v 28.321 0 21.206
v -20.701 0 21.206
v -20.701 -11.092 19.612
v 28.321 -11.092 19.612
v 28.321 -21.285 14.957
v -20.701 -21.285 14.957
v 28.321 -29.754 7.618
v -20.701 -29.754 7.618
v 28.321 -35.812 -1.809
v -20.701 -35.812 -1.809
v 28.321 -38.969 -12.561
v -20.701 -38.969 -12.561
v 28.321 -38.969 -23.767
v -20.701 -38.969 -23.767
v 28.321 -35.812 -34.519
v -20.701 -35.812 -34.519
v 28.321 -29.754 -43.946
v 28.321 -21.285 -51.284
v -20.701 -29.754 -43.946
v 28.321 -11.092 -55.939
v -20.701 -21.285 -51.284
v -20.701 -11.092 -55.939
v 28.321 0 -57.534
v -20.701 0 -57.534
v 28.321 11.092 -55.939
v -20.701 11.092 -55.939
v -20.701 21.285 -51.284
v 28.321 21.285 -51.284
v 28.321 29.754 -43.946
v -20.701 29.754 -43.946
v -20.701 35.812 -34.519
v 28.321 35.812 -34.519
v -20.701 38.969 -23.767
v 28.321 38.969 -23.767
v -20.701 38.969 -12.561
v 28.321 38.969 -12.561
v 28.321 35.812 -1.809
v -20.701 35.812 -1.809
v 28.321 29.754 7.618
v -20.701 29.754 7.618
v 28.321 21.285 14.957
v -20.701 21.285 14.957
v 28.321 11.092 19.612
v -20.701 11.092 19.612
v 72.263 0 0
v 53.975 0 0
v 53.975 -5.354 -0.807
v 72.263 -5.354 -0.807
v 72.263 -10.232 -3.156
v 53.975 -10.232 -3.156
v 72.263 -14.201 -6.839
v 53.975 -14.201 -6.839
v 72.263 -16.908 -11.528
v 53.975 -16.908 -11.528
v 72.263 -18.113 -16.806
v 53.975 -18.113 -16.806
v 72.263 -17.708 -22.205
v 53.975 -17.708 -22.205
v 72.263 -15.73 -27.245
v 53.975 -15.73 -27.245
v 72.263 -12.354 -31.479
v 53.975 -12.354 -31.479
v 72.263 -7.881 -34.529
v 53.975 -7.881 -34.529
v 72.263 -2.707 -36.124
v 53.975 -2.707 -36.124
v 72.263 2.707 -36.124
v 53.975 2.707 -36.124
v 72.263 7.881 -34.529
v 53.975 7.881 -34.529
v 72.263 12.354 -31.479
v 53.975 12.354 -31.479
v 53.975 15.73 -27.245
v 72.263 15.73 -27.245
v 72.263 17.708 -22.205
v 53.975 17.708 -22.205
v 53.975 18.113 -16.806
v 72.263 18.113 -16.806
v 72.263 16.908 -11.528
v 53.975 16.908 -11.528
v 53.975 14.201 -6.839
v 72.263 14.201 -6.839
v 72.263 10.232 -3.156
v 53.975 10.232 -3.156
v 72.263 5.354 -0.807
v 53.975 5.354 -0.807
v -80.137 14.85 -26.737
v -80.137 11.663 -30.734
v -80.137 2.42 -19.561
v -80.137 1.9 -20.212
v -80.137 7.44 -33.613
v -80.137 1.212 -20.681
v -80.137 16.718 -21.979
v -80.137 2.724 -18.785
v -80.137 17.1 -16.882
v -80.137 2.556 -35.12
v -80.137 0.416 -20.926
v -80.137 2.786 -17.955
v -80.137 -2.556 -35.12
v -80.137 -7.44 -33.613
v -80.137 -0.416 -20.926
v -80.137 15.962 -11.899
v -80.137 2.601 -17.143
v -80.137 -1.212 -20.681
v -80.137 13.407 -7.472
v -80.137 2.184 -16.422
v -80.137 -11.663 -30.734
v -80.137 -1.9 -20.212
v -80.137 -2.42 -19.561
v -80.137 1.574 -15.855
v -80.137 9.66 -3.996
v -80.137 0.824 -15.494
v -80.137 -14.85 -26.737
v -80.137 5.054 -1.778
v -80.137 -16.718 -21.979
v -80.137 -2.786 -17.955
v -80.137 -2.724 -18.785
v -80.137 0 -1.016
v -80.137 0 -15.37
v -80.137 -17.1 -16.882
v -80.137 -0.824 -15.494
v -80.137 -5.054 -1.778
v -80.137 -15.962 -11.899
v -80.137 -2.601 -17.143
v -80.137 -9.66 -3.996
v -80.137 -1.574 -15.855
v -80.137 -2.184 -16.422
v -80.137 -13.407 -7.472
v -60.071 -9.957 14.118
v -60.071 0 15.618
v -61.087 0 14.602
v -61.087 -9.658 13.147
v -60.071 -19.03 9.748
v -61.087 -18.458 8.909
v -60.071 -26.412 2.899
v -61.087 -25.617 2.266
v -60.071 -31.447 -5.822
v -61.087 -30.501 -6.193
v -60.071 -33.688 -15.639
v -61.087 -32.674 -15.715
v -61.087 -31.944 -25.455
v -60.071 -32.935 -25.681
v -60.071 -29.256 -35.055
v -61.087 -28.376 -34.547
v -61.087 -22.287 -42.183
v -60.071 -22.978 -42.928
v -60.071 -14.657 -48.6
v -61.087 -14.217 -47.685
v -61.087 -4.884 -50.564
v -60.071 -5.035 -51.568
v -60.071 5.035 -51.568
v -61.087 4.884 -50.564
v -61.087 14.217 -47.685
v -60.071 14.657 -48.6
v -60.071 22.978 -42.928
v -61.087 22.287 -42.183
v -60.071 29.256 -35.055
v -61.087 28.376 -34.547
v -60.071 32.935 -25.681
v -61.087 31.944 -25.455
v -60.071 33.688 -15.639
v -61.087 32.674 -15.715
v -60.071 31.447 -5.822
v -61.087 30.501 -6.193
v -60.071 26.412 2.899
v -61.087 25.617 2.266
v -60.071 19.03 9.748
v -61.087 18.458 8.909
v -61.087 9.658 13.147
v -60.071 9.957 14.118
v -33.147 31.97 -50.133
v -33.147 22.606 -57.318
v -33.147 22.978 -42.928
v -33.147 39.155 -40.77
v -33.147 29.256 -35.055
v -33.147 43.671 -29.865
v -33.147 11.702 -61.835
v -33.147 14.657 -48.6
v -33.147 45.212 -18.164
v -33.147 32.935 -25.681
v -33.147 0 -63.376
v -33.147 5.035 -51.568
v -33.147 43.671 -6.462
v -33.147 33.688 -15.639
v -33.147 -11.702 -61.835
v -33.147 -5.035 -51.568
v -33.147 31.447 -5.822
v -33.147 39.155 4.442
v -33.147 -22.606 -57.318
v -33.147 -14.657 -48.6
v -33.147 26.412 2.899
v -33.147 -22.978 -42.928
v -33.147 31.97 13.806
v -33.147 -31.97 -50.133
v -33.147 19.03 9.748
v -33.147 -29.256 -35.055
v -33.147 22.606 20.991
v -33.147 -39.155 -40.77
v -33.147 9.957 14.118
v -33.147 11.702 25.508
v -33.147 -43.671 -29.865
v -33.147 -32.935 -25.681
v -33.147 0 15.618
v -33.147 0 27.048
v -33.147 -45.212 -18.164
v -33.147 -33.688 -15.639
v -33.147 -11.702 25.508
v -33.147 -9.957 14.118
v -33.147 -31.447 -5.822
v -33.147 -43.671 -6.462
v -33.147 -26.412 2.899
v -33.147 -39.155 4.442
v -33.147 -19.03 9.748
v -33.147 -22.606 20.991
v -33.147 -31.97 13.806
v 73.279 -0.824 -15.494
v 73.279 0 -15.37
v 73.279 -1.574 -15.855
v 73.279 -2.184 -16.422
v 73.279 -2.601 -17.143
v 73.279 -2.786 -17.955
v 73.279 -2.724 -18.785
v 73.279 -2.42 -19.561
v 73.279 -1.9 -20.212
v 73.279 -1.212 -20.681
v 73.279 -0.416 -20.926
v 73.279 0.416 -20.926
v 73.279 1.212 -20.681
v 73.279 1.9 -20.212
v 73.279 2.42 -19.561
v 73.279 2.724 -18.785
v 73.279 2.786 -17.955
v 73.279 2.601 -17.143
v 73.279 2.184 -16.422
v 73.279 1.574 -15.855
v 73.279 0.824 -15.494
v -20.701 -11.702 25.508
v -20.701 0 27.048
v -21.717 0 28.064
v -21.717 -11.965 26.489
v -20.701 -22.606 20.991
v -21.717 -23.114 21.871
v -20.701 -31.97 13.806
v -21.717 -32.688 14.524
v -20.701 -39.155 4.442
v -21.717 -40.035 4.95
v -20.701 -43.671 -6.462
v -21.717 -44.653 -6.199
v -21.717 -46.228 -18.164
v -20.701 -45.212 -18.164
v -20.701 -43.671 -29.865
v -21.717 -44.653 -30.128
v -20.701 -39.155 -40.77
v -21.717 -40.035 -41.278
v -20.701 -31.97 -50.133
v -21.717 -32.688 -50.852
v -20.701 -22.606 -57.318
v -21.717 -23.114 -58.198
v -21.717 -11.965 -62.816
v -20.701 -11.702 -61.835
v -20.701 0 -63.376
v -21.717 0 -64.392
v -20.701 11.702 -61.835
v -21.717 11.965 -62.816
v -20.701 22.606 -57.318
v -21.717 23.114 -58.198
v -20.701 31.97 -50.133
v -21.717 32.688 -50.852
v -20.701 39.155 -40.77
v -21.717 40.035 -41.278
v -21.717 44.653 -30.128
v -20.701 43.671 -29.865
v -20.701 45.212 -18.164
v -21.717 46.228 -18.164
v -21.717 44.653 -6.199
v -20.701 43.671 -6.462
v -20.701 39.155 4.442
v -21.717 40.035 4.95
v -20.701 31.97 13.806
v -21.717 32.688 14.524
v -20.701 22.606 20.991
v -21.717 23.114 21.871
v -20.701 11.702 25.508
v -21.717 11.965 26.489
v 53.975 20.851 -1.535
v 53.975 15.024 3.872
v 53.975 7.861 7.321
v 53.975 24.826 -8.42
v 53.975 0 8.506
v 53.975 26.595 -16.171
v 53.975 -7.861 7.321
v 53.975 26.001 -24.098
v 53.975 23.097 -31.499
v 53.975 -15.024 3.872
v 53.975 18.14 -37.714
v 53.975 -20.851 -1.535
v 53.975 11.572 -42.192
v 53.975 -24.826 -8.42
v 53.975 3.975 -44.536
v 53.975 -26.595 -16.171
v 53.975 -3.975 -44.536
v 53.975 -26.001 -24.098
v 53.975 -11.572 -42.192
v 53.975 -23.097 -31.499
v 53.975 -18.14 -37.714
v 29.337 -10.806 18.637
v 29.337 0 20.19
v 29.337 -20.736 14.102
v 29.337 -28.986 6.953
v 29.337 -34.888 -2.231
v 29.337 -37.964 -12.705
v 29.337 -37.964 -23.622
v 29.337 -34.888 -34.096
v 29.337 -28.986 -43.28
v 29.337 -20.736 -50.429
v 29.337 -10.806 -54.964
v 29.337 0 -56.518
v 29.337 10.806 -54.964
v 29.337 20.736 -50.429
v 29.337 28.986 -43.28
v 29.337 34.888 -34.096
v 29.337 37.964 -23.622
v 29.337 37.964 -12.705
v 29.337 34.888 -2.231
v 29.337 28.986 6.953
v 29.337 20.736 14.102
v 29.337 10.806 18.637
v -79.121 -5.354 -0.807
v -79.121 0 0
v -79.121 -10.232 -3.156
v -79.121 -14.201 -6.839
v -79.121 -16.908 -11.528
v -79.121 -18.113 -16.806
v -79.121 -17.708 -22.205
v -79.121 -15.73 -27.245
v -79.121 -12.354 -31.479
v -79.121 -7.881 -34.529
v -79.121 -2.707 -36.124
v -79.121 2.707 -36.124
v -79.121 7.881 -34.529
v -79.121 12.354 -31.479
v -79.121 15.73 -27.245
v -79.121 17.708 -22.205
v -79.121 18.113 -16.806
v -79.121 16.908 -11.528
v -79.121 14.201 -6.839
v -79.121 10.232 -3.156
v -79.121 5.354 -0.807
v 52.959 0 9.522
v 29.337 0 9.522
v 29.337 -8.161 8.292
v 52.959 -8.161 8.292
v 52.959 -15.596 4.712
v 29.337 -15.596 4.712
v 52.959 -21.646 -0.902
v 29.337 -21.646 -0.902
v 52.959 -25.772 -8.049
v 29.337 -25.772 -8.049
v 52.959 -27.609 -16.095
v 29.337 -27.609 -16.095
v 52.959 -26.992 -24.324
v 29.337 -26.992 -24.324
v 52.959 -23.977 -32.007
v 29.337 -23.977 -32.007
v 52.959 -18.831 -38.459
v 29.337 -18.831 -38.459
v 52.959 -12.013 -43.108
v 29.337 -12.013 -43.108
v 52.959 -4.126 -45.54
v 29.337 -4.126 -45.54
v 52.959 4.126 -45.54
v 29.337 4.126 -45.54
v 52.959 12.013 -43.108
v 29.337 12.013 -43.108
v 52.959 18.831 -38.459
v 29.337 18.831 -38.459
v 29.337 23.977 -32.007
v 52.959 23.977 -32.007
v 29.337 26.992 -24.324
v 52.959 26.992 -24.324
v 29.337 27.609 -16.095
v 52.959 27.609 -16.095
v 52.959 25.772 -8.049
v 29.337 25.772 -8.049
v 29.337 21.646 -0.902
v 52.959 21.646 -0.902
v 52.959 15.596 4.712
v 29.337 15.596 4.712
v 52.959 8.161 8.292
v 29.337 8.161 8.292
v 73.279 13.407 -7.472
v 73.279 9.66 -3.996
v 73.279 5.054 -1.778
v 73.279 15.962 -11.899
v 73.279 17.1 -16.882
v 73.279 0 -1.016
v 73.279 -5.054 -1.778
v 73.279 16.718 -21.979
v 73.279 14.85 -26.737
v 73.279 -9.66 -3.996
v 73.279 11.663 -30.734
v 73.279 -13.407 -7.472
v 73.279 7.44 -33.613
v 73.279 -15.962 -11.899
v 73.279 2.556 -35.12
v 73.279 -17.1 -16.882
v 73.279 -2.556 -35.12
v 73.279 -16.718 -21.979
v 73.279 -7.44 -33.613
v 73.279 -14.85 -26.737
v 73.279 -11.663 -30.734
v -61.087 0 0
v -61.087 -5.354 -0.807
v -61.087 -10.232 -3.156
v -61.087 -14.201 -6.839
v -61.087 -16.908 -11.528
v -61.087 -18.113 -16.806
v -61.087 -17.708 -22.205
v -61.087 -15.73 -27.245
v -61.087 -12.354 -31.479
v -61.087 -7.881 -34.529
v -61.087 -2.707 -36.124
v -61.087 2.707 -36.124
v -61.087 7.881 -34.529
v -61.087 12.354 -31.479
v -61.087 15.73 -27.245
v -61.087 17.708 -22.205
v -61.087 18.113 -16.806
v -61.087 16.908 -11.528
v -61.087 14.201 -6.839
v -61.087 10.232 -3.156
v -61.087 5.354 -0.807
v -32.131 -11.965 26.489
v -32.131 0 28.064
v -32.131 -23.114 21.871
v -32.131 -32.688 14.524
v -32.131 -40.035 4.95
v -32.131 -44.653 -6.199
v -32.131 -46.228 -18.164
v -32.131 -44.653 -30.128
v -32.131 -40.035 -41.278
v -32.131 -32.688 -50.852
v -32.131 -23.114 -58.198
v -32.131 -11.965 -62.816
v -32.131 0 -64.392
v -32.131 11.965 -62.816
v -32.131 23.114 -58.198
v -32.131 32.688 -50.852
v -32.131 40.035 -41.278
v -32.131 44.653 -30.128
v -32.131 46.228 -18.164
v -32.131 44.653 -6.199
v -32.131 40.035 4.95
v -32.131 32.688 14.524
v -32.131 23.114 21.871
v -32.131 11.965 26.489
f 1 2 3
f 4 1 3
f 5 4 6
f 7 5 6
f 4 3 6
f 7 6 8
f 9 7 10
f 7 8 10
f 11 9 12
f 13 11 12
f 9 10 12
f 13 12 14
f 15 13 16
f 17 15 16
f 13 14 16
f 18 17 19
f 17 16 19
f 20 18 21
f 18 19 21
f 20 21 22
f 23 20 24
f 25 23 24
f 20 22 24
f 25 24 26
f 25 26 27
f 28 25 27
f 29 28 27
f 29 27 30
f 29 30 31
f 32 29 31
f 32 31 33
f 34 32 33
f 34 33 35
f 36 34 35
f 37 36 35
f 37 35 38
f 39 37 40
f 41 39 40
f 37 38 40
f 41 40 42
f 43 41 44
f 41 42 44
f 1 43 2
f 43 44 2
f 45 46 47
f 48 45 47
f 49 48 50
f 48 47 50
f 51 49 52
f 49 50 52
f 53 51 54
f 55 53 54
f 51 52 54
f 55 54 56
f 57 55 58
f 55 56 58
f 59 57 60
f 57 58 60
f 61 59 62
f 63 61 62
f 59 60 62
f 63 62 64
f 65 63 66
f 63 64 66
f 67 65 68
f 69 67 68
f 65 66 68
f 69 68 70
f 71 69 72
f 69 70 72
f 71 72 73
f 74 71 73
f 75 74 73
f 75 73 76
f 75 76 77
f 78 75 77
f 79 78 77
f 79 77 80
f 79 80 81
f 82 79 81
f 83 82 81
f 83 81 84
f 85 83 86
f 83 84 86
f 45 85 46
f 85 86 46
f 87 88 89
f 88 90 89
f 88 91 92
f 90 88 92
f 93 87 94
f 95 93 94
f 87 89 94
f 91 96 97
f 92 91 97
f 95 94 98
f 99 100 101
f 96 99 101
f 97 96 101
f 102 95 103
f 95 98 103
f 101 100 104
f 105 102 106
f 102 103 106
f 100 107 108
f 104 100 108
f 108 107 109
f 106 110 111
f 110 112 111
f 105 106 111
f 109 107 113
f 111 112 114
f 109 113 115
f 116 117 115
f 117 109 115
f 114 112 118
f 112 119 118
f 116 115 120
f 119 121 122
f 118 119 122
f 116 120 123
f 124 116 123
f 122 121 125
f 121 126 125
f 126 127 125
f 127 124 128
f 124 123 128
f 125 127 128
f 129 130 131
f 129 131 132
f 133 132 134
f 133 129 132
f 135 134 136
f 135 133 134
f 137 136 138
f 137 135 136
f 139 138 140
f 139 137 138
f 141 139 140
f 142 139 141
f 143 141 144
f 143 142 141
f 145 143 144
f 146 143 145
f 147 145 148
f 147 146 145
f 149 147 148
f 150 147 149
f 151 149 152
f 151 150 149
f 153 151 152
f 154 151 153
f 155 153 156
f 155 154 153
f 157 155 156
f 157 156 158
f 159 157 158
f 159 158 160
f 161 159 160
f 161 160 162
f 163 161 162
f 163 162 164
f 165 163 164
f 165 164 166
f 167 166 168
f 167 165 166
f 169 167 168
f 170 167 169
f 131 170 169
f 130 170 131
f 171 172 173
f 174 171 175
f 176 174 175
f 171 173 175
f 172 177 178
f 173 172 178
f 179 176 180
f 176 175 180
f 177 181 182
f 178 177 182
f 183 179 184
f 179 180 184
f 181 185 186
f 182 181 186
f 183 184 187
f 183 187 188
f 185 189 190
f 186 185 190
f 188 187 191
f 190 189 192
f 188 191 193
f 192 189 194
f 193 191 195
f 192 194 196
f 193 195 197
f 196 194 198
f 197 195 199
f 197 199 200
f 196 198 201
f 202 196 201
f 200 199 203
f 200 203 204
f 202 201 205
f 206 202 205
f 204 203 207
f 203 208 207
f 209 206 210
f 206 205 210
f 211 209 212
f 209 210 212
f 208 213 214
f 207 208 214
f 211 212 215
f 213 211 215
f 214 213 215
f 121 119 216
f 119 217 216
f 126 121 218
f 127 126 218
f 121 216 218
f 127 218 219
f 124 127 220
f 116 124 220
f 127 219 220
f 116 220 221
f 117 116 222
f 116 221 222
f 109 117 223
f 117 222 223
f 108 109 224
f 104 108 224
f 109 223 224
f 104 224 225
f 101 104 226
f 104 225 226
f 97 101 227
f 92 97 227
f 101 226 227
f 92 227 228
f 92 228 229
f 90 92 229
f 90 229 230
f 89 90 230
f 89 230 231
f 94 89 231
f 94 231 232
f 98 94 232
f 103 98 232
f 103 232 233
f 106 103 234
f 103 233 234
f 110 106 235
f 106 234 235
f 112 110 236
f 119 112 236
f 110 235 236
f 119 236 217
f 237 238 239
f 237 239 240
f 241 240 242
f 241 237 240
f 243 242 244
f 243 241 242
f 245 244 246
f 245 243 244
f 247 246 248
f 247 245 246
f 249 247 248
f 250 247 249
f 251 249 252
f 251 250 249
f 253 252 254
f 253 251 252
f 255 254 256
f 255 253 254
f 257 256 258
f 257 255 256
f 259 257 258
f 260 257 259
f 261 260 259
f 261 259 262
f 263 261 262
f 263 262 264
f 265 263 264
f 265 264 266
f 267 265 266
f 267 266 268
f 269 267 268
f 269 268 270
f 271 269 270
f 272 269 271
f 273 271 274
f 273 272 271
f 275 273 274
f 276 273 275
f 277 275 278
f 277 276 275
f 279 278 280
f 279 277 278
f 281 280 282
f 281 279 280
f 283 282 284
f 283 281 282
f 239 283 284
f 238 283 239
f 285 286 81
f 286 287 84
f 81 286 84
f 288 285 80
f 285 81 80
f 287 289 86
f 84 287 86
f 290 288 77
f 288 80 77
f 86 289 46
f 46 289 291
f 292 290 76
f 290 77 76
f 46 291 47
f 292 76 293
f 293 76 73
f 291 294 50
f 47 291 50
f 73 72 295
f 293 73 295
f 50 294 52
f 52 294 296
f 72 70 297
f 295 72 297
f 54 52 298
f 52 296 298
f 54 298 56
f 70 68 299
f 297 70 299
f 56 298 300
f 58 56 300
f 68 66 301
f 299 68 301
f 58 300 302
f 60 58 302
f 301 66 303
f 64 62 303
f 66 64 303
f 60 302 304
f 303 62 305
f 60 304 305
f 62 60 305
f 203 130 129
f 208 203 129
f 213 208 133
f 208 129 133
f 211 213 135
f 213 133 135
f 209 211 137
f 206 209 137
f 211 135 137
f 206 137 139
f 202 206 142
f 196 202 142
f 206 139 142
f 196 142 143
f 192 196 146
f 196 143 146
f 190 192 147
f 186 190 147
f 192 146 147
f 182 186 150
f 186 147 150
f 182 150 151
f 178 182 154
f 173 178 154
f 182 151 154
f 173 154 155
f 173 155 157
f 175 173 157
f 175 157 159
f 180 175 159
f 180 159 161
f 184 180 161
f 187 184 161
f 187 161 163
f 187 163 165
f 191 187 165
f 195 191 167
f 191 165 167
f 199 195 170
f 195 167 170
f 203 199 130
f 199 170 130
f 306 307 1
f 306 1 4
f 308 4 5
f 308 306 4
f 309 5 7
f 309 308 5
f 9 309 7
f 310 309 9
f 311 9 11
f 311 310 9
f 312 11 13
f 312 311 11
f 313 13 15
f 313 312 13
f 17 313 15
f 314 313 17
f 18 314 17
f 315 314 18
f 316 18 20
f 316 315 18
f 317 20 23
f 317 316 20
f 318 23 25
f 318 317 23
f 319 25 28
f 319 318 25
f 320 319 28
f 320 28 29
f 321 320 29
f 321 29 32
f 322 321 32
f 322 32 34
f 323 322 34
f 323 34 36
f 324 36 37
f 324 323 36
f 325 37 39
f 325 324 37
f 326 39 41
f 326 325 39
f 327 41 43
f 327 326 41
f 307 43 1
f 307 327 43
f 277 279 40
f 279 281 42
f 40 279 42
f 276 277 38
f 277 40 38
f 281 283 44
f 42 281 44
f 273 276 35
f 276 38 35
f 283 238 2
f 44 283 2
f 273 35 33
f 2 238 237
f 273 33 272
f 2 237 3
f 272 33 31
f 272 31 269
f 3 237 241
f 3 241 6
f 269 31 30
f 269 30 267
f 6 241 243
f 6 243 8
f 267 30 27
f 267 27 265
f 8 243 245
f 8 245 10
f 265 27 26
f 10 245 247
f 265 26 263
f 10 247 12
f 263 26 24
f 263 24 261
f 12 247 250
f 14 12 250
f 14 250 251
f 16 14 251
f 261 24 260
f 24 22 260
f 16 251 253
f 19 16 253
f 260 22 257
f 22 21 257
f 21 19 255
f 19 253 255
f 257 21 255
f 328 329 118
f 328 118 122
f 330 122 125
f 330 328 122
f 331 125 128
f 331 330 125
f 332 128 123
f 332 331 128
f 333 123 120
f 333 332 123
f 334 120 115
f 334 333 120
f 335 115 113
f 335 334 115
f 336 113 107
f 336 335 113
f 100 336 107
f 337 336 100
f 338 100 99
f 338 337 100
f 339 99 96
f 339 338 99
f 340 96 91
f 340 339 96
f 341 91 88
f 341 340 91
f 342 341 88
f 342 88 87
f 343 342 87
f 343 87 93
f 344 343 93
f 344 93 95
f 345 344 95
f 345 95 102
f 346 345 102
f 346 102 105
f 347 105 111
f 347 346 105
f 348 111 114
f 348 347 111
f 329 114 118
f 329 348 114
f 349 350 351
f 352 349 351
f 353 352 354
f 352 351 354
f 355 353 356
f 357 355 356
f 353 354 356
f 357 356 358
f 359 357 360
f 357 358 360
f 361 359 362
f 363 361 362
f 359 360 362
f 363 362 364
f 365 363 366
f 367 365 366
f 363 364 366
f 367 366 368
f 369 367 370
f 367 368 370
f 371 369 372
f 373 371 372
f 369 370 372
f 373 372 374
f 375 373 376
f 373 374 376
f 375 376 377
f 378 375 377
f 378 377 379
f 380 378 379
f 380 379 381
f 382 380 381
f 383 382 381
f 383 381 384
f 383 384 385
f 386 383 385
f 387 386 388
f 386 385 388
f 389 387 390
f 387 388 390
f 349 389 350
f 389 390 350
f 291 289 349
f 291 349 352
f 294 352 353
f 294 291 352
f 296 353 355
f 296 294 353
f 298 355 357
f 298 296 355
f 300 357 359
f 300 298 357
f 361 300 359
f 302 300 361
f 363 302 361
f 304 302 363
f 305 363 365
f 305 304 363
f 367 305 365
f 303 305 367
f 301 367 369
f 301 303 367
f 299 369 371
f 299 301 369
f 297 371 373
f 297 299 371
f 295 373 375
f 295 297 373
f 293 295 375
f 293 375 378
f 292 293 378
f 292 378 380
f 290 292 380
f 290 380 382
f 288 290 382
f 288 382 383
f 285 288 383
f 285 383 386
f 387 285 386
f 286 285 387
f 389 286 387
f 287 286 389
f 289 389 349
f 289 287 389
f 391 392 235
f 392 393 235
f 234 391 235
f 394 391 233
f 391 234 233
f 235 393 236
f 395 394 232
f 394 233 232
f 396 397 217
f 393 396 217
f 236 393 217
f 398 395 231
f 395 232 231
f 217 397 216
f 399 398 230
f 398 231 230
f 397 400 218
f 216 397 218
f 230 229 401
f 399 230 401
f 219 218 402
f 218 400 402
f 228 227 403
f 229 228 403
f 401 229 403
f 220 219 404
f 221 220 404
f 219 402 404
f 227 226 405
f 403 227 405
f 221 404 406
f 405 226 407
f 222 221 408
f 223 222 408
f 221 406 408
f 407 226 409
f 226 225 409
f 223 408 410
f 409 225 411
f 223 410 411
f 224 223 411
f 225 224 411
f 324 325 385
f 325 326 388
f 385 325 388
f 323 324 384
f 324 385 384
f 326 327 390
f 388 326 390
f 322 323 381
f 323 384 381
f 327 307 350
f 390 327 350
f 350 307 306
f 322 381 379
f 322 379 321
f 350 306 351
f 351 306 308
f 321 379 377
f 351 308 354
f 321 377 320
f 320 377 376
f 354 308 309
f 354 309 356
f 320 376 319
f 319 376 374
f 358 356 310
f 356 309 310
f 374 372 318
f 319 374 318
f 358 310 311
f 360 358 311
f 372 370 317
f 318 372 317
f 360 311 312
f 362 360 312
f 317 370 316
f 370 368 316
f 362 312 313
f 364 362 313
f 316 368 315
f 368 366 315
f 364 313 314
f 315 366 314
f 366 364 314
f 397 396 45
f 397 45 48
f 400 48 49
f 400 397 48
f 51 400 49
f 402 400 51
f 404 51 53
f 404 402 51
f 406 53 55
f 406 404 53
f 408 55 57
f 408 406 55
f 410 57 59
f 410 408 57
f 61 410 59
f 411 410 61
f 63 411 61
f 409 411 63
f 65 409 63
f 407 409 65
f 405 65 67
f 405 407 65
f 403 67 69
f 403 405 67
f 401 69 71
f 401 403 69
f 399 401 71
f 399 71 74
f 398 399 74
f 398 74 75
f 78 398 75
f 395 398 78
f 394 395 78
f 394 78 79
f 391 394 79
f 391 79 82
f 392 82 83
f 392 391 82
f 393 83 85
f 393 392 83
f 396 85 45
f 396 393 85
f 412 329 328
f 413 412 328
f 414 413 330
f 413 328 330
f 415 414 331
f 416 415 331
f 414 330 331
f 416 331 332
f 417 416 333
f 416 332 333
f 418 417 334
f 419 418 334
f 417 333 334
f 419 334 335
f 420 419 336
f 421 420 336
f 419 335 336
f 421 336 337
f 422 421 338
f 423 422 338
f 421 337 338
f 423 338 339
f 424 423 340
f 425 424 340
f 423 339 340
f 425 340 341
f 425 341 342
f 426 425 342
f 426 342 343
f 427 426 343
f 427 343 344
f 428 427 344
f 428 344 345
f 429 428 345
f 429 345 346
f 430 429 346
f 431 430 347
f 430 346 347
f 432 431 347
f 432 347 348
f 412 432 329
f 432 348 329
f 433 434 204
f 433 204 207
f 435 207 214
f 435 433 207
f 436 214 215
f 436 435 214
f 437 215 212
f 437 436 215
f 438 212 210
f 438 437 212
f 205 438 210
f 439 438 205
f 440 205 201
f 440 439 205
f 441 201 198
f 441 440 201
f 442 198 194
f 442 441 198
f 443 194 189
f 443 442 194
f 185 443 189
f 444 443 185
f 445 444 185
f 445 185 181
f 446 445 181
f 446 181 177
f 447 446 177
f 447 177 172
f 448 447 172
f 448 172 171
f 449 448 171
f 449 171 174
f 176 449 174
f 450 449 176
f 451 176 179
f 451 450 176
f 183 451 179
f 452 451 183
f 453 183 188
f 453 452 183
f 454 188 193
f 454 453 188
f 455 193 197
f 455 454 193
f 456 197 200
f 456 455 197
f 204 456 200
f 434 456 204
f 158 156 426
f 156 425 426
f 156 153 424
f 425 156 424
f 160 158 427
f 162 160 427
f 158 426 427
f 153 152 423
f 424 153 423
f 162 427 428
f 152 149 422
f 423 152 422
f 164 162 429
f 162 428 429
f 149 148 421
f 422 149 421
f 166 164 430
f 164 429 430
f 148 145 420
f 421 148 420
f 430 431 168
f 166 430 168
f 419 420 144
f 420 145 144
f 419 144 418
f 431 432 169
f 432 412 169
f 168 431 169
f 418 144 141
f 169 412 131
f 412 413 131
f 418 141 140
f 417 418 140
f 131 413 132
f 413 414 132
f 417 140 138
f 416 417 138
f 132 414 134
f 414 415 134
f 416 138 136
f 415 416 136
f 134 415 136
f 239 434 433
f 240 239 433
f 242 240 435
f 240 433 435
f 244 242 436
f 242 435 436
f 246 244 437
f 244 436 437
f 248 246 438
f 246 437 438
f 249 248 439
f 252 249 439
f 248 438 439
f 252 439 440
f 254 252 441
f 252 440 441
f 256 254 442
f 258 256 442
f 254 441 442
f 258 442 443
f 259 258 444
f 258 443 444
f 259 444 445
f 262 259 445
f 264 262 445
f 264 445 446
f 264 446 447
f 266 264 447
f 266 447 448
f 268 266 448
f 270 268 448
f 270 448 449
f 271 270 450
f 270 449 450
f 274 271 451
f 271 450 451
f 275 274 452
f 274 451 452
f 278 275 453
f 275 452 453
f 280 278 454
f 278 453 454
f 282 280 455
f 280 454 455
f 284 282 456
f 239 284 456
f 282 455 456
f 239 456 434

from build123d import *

# Parameters (mm, degrees)
F2_SIZE = 1.016
F3_SIZE = 1.016
F4_SIZE = 1.016
F5_SIZE = 1.016
F6_SIZE = 1.016
F7_SIZE = 1.016
F8_SIZE = 1.016


with BuildPart() as f1:
    # F0 (on Front) → F1 (revolve)
    with BuildSketch(Plane.XZ):
        Polygon((-80.1369994879, 0), (-80.1369994879, -15.3696453199), (73.2790008187, -15.3696453199), (73.2790008187, 0), (53.9750047028, 0), (53.9750047028, 9.5223551616), (29.3370001018, 9.5223551616), (29.3370001018, 21.2063547224), (-20.7010004669, 21.2063547224), (-20.7010004669, 28.0643533915), (-33.1469997764, 28.0643533915), (-33.1469997764, 15.6183550134), (-61.0870011151, 15.6183550134), (-61.0870011151, 0), align=None)
    revolve(axis=Axis((-3.302000463, 0, -18.16364564), (1, 0, 0)))

    # F2
    f2_edges = [f1.edges().sort_by_distance(p)[0] for p in [
        (-80.136999, 0, -36.327291),
    ]]
    chamfer(f2_edges, length=F2_SIZE)

    # F3
    f3_edges = [f1.edges().sort_by_distance(p)[0] for p in [
        (-61.087001, 0, -51.945646),
    ]]
    chamfer(f3_edges, length=F3_SIZE)

    # F4
    f4_edges = [f1.edges().sort_by_distance(p)[0] for p in [
        (-33.147, 0, -64.391645),
    ]]
    chamfer(f4_edges, length=F4_SIZE)

    # F5
    f5_edges = [f1.edges().sort_by_distance(p)[0] for p in [
        (-20.701, 0, -64.391645),
    ]]
    chamfer(f5_edges, length=F5_SIZE)

    # F6
    f6_edges = [f1.edges().sort_by_distance(p)[0] for p in [
        (29.337, 0, -57.533646),
    ]]
    chamfer(f6_edges, length=F6_SIZE)

    # F7
    f7_edges = [f1.edges().sort_by_distance(p)[0] for p in [
        (53.975005, 0, -45.849646),
    ]]
    chamfer(f7_edges, length=F7_SIZE)

    # F8
    f8_edges = [f1.edges().sort_by_distance(p)[0] for p in [
        (73.279001, 0, -36.327291),
    ]]
    chamfer(f8_edges, length=F8_SIZE)


solid = f1.part
